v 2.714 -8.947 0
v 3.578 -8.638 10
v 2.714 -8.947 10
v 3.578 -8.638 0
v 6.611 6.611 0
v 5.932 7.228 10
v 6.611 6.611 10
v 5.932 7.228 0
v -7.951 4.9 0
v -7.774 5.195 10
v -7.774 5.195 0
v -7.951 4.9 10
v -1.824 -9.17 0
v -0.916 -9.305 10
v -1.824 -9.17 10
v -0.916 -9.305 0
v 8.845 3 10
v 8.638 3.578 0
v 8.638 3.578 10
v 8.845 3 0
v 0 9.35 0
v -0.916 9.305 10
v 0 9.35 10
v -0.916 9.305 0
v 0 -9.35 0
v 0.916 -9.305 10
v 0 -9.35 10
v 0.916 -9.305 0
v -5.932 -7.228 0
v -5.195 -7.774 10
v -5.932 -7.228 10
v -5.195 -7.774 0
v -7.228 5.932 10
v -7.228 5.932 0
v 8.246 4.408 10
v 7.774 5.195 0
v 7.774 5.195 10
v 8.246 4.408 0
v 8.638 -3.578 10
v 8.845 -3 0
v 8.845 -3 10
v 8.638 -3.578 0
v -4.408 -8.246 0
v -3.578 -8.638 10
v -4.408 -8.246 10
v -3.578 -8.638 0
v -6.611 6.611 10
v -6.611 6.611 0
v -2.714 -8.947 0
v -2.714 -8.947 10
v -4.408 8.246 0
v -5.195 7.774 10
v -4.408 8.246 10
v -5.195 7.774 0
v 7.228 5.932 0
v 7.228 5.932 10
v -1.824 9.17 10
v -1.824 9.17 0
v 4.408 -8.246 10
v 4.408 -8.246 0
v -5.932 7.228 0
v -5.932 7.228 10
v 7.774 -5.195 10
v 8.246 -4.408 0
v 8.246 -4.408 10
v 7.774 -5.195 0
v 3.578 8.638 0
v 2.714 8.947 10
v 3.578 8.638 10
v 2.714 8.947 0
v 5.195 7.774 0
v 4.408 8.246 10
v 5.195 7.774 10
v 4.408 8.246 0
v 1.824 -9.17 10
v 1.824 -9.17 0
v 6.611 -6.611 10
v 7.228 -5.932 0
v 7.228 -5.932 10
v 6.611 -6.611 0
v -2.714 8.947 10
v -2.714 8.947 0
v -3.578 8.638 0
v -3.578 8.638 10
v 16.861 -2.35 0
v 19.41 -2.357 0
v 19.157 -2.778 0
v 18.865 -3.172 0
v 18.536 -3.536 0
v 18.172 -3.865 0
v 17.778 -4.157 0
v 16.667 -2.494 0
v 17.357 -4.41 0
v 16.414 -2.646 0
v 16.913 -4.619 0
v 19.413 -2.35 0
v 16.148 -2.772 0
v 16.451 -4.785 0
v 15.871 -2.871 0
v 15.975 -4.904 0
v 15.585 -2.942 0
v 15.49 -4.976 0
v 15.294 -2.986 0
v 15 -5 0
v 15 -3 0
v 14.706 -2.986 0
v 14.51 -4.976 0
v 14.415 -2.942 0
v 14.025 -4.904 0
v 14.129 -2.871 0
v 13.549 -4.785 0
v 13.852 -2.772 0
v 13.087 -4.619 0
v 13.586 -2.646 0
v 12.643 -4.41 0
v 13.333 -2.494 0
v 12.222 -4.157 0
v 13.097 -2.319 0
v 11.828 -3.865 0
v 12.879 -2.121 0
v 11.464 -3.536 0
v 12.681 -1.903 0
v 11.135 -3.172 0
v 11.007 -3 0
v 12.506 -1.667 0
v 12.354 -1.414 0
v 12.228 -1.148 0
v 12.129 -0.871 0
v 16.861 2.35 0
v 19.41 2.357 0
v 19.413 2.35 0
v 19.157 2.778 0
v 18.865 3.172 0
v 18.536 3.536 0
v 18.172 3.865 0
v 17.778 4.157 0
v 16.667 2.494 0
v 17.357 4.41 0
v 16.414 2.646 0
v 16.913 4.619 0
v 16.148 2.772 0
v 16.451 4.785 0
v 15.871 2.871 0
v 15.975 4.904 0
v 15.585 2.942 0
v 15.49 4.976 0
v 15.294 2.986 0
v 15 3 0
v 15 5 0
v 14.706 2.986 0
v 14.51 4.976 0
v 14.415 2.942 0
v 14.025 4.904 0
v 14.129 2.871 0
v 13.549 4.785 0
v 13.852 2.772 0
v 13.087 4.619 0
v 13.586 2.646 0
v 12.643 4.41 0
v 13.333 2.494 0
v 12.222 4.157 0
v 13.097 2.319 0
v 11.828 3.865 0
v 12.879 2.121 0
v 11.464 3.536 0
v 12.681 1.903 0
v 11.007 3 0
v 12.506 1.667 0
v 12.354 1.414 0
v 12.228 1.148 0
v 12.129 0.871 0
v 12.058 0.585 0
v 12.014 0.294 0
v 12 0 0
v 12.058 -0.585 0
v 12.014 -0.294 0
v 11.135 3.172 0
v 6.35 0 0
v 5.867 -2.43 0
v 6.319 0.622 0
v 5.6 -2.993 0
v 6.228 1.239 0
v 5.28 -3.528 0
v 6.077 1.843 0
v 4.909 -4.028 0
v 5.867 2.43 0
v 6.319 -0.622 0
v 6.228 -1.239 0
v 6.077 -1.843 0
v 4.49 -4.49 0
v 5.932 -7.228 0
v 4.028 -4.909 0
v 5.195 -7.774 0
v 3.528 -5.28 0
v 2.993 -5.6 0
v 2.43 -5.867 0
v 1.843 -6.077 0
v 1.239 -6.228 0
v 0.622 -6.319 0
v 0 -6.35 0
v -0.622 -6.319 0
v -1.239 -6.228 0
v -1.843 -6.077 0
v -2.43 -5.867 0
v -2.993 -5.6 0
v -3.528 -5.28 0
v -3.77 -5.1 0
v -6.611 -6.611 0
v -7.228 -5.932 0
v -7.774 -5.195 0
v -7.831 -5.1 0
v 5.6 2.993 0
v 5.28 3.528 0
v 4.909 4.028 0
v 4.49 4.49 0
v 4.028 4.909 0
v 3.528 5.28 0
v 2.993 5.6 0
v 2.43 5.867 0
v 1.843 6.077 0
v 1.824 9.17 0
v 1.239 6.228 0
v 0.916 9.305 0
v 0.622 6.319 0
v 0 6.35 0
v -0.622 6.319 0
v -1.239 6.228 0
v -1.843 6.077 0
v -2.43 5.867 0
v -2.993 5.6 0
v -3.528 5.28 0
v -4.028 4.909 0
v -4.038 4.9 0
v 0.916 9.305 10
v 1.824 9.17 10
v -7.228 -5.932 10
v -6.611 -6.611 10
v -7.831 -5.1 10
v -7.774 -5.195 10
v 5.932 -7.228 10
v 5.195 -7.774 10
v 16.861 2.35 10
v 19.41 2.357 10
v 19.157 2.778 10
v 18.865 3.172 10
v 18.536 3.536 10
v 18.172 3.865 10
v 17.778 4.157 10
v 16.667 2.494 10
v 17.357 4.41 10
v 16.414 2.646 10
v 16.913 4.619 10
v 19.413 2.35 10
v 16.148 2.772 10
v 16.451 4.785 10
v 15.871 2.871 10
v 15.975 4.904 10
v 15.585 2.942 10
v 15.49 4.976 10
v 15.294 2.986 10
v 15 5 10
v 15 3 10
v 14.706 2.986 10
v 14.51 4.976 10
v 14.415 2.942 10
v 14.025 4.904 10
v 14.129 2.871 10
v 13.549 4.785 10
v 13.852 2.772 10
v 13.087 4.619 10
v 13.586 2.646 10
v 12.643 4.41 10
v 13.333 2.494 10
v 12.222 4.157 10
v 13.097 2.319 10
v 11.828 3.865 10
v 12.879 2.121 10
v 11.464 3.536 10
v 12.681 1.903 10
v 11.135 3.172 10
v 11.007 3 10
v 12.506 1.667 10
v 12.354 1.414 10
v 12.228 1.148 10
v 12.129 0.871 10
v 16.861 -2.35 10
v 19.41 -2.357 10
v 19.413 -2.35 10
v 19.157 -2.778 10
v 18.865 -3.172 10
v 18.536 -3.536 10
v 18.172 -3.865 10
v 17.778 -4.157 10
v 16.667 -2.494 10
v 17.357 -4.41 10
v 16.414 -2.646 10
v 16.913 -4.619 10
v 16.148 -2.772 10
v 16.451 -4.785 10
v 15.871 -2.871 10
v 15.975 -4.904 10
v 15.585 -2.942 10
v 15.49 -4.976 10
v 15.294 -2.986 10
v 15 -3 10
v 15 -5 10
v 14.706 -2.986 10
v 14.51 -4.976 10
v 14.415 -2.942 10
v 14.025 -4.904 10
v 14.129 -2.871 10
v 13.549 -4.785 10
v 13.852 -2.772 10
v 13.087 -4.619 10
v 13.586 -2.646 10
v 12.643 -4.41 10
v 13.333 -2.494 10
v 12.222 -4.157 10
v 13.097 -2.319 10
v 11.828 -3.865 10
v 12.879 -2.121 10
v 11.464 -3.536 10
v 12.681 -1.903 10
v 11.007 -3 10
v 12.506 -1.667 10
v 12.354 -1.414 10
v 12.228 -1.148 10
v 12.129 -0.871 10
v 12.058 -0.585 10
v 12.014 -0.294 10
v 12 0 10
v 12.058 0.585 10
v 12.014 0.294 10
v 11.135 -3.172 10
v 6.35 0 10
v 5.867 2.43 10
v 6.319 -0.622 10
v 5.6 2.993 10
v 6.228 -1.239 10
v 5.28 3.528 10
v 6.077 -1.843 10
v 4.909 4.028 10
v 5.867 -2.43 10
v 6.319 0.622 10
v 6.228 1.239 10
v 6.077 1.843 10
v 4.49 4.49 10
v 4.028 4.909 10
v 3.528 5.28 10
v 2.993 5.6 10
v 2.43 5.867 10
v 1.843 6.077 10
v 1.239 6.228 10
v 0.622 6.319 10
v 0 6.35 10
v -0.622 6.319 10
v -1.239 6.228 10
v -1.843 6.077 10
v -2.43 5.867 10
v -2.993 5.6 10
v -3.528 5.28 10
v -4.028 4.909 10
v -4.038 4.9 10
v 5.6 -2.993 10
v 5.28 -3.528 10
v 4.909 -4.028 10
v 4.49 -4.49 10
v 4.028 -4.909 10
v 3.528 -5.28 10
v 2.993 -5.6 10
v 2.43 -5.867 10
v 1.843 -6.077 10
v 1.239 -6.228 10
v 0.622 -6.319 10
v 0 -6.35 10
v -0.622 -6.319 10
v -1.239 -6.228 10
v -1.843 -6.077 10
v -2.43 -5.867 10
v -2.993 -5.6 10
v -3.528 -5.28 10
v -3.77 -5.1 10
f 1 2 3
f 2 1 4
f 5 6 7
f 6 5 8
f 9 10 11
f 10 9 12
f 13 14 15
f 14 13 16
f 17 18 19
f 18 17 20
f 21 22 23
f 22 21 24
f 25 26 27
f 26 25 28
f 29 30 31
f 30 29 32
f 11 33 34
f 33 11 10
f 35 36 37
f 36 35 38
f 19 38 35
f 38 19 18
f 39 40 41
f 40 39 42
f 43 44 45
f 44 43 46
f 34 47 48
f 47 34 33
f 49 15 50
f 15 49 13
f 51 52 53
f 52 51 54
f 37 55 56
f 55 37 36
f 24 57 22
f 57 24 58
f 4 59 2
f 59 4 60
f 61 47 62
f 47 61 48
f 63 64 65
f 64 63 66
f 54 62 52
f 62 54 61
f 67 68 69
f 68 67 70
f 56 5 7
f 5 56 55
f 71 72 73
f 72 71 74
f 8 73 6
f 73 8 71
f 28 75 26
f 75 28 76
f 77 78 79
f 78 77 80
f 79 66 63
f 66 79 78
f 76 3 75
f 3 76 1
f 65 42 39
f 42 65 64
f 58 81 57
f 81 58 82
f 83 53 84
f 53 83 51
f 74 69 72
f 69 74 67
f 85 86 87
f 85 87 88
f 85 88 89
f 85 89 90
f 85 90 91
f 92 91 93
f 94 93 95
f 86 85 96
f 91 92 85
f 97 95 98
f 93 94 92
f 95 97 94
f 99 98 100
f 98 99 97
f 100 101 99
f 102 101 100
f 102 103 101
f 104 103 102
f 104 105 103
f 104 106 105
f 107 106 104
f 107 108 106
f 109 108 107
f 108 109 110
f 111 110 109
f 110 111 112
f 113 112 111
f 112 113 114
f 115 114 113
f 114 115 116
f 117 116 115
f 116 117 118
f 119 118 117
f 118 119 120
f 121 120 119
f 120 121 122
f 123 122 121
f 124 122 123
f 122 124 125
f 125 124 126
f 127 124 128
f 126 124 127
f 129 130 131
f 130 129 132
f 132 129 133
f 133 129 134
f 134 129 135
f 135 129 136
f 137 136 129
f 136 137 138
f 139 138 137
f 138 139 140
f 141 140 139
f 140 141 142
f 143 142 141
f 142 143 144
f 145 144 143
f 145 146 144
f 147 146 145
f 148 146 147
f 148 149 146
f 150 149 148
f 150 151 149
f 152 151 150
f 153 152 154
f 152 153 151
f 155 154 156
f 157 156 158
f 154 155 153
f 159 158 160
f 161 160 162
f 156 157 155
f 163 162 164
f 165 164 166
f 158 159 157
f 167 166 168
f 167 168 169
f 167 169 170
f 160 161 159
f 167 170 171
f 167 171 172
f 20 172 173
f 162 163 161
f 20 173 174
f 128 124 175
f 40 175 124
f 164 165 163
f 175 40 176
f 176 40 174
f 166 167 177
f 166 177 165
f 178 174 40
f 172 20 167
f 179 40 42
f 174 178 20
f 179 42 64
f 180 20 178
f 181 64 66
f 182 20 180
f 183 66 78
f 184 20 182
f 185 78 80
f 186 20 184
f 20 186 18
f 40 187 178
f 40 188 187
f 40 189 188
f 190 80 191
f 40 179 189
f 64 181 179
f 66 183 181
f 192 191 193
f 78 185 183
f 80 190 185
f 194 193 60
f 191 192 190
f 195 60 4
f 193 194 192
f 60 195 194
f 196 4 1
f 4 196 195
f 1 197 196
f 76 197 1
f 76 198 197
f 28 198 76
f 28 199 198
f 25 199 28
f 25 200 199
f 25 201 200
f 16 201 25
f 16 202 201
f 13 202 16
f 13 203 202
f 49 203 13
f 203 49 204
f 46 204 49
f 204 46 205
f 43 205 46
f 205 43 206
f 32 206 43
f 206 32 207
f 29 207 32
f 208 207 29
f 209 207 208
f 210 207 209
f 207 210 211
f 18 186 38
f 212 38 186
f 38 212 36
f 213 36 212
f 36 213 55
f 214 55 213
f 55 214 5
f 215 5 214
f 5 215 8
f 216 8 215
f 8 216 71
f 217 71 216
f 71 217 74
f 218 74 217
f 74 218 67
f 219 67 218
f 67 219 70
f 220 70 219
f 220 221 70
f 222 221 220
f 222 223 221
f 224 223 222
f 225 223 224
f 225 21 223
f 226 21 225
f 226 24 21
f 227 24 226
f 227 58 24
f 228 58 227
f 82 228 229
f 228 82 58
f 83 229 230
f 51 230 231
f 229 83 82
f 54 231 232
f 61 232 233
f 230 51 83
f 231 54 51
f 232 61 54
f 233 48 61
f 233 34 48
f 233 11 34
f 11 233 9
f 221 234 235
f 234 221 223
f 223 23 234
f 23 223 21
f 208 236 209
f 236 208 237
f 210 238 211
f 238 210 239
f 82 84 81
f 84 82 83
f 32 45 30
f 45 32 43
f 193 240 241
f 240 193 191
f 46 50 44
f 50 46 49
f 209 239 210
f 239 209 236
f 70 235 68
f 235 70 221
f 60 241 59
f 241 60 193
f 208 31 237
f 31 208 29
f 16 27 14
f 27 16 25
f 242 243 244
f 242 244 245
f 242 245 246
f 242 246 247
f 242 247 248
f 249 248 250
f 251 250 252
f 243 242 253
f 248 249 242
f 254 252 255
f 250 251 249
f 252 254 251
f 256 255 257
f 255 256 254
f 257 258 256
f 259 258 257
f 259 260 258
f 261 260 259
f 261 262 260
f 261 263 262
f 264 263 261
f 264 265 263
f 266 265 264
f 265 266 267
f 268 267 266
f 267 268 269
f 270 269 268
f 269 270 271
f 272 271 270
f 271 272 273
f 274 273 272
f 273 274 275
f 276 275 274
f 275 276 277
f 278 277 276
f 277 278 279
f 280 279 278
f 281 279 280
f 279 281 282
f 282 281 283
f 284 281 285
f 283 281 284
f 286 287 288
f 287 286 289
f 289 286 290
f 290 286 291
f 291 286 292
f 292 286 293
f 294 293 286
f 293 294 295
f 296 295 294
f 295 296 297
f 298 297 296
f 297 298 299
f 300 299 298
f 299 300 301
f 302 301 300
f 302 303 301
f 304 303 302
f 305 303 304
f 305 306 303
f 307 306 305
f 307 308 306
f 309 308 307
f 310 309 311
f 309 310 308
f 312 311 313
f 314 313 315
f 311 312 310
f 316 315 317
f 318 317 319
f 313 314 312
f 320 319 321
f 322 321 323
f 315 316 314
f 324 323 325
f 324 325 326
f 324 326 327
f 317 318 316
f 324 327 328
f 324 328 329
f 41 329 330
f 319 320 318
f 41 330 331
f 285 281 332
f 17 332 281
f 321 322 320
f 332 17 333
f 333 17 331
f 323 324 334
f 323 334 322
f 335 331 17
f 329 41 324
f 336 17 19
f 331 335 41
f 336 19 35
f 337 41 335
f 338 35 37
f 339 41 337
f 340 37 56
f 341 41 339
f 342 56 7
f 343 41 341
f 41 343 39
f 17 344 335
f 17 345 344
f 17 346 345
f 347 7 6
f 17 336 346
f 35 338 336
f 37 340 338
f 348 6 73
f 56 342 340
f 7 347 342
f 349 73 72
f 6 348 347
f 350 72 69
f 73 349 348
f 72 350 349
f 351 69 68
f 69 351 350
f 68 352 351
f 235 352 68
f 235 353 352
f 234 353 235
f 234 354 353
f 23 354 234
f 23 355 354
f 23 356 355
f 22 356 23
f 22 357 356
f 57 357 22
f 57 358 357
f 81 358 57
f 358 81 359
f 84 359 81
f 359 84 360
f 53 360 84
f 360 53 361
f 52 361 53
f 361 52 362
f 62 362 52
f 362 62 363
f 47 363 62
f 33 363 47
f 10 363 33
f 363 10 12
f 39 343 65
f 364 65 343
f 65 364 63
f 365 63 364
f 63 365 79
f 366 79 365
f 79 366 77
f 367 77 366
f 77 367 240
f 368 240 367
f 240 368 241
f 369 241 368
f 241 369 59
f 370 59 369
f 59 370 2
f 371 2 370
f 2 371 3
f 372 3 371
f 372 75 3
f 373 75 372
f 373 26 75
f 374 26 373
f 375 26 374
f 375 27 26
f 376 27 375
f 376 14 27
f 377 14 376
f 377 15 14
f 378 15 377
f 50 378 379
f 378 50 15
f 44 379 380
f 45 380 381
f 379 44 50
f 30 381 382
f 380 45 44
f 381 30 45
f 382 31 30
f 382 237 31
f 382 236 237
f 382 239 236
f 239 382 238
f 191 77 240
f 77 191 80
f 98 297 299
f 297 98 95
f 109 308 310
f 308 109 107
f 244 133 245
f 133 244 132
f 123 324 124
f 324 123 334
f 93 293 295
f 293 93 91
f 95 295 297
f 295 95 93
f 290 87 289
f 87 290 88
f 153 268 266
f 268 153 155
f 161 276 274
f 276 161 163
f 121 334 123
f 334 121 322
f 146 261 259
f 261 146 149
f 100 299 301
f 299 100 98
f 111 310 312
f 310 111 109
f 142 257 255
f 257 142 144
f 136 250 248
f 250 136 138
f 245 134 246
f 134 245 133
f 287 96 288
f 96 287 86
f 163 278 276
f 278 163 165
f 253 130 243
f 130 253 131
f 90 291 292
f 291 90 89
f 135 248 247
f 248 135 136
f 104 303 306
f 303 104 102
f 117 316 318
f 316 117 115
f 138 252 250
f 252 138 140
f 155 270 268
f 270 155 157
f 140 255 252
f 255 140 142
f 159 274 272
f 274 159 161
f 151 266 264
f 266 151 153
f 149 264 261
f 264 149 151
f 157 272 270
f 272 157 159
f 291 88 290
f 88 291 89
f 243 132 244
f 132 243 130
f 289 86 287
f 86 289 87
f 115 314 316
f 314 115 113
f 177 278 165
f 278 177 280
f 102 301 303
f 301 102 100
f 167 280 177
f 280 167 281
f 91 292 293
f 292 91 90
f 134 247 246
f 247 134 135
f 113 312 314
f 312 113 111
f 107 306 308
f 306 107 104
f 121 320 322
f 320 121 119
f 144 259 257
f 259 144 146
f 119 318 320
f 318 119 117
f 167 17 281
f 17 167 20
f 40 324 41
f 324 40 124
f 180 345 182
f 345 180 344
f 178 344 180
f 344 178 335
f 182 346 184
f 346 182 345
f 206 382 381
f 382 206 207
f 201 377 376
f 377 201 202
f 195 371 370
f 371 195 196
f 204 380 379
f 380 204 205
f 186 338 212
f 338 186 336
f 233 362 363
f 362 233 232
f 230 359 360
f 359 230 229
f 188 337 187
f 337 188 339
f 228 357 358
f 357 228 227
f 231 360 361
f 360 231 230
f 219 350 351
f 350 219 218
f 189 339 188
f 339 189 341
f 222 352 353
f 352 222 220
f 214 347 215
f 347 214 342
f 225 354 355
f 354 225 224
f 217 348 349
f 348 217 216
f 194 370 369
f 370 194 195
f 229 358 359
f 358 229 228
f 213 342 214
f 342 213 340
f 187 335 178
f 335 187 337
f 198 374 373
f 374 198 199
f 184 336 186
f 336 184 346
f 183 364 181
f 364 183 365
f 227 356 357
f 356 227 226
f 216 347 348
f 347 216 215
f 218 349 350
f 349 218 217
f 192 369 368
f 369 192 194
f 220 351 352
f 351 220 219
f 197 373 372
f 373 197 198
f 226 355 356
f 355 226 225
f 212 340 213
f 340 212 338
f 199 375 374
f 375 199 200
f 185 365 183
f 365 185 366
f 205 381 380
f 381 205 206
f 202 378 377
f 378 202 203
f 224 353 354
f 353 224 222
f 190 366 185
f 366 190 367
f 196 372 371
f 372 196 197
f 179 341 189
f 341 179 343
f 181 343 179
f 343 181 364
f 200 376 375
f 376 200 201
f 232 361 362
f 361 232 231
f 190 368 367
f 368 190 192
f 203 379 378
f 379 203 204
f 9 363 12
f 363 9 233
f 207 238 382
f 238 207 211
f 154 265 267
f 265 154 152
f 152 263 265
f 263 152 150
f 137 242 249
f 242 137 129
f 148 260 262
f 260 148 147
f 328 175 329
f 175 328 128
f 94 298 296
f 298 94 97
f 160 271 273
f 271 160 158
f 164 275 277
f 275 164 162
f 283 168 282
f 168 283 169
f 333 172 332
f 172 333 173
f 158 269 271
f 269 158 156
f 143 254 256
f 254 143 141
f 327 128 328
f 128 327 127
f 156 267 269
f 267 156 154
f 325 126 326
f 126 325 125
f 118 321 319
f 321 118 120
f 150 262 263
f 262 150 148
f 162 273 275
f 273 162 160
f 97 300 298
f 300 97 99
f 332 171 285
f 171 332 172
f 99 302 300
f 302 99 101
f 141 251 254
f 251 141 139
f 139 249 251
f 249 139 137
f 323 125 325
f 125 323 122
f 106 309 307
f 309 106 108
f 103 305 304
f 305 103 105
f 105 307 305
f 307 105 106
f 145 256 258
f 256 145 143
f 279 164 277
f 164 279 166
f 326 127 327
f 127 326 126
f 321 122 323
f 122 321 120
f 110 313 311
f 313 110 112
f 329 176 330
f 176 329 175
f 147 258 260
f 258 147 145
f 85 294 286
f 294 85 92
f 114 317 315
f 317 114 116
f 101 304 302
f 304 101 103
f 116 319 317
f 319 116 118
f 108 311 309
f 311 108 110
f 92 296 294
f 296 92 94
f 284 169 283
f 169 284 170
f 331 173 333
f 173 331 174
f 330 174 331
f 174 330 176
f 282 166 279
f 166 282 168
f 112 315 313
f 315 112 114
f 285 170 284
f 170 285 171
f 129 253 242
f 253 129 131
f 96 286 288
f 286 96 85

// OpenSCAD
// --- Parameters ---
// Rod Ring Dimensions
rod_inner_dia = 12.7;      // Inner diameter of the rod ring (mm)
rod_wall_thick = 3.0;      // Wall thickness of the rod ring (mm)
rod_opening_w = 10.0;      // Width of the gap in the rod ring (mm)
rod_opening_h = 10.0;      // Height of the gap in the rod ring (mm)

// Tubing Ring Dimensions
tube_inner_dia = 6.0;       // Inner diameter of the tubing ring (mm)
tube_wall_thick = 2.0;      // Wall thickness of the tubing ring (mm)
tube_opening_w = 4.5;       // Width of the gap in the tubing ring (mm)
tube_opening_h = 10.0;      // Height of the gap in the tubing ring (mm)

// Bridge Dimensions
bridge_width_y = 6.0;       // Width of the bridge along the Y axis (mm)
bridge_x_start = 8.0;       // Start position of bridge along X axis (mm)
bridge_x_end = 12.0;        // End position of bridge along X axis (mm)

// Extrusion Height
extrusion_z = 10.0;         // Total height of the part (mm)

// Resolution
fn_val = 64;                // Smoothness for circular features

// --- Calculations ---
rod_outer_dia = rod_inner_dia + (2 * rod_wall_thick);
tube_outer_dia = tube_inner_dia + (2 * tube_wall_thick);

// Offsets for clean manifold geometry (preventing coplanar faces)
offset = 0.1;

// --- Main Model ---
// The part is built upward from Z=0 as requested.
// We use a union of the positive features and then subtract the holes.
// To ensure the part starts at Z=0, we do not use center=true for the main extrusion.

module part_profile() {
    union() {
        // 1. Rod Ring (centered at origin)
        cylinder(d = rod_outer_dia, h = extrusion_z, $fn = fn_val);
        
        // 2. Tubing Ring (centered at x=15, y=0)
        translate([15, 0, 0])
            cylinder(d = tube_outer_dia, h = extrusion_z, $fn = fn_val);
        
        // 3. Solid Bridge (between x=8 and x=12, width 6 in Y)
        // Centered on Y: Y range is -3 to +3
        translate([bridge_x_start, -bridge_width_y/2, 0])
            cube([bridge_x_end - bridge_x_start, bridge_width_y, extrusion_z]);
    }
}

difference() {
    // The base profile
    part_profile();

    // --- Subtraction Operations ---

    // A. Rod Inner Hole (centered at origin)
    // We extend the height to ensure it cuts through the top and bottom
    translate([0, 0, -offset])
        cylinder(d = rod_inner_dia, h = extrusion_z + 2*offset, $fn = fn_val);

    // B. Rod Ring Opening (Snap-on gap)
    // "everything with x < 0 and -5 < y < 5 is removed"
    // We use a large cube to ensure it cuts through the ring completely.
    translate([-rod_outer_dia - offset, -5.0 - offset, -offset])
        cube([rod_outer_dia + 2*offset, 10.0, extrusion_z + 2*offset]);

    // C. Tubing Inner Hole (centered at x=15, y=0)
    translate([15, 0, -offset])
        cylinder(d = tube_inner_dia, h = extrusion_z + 2*offset, $fn = fn_val);

    // D. Tubing Ring Opening (Snap-on gap)
    // "x > 15 and -2.25 < y < 2.25 is removed"
    // We use a large cube to ensure it cuts through the ring completely.
    translate([15, -2.25 - offset, -offset])
        cube([tube_outer_dia, 4.5 + 2*offset, extrusion_z + 2*offset]);
}

// Final check: The part is built from Z=0 to Z=10.
// The cylinders are not centered on Z, so the base is at Z=0.
